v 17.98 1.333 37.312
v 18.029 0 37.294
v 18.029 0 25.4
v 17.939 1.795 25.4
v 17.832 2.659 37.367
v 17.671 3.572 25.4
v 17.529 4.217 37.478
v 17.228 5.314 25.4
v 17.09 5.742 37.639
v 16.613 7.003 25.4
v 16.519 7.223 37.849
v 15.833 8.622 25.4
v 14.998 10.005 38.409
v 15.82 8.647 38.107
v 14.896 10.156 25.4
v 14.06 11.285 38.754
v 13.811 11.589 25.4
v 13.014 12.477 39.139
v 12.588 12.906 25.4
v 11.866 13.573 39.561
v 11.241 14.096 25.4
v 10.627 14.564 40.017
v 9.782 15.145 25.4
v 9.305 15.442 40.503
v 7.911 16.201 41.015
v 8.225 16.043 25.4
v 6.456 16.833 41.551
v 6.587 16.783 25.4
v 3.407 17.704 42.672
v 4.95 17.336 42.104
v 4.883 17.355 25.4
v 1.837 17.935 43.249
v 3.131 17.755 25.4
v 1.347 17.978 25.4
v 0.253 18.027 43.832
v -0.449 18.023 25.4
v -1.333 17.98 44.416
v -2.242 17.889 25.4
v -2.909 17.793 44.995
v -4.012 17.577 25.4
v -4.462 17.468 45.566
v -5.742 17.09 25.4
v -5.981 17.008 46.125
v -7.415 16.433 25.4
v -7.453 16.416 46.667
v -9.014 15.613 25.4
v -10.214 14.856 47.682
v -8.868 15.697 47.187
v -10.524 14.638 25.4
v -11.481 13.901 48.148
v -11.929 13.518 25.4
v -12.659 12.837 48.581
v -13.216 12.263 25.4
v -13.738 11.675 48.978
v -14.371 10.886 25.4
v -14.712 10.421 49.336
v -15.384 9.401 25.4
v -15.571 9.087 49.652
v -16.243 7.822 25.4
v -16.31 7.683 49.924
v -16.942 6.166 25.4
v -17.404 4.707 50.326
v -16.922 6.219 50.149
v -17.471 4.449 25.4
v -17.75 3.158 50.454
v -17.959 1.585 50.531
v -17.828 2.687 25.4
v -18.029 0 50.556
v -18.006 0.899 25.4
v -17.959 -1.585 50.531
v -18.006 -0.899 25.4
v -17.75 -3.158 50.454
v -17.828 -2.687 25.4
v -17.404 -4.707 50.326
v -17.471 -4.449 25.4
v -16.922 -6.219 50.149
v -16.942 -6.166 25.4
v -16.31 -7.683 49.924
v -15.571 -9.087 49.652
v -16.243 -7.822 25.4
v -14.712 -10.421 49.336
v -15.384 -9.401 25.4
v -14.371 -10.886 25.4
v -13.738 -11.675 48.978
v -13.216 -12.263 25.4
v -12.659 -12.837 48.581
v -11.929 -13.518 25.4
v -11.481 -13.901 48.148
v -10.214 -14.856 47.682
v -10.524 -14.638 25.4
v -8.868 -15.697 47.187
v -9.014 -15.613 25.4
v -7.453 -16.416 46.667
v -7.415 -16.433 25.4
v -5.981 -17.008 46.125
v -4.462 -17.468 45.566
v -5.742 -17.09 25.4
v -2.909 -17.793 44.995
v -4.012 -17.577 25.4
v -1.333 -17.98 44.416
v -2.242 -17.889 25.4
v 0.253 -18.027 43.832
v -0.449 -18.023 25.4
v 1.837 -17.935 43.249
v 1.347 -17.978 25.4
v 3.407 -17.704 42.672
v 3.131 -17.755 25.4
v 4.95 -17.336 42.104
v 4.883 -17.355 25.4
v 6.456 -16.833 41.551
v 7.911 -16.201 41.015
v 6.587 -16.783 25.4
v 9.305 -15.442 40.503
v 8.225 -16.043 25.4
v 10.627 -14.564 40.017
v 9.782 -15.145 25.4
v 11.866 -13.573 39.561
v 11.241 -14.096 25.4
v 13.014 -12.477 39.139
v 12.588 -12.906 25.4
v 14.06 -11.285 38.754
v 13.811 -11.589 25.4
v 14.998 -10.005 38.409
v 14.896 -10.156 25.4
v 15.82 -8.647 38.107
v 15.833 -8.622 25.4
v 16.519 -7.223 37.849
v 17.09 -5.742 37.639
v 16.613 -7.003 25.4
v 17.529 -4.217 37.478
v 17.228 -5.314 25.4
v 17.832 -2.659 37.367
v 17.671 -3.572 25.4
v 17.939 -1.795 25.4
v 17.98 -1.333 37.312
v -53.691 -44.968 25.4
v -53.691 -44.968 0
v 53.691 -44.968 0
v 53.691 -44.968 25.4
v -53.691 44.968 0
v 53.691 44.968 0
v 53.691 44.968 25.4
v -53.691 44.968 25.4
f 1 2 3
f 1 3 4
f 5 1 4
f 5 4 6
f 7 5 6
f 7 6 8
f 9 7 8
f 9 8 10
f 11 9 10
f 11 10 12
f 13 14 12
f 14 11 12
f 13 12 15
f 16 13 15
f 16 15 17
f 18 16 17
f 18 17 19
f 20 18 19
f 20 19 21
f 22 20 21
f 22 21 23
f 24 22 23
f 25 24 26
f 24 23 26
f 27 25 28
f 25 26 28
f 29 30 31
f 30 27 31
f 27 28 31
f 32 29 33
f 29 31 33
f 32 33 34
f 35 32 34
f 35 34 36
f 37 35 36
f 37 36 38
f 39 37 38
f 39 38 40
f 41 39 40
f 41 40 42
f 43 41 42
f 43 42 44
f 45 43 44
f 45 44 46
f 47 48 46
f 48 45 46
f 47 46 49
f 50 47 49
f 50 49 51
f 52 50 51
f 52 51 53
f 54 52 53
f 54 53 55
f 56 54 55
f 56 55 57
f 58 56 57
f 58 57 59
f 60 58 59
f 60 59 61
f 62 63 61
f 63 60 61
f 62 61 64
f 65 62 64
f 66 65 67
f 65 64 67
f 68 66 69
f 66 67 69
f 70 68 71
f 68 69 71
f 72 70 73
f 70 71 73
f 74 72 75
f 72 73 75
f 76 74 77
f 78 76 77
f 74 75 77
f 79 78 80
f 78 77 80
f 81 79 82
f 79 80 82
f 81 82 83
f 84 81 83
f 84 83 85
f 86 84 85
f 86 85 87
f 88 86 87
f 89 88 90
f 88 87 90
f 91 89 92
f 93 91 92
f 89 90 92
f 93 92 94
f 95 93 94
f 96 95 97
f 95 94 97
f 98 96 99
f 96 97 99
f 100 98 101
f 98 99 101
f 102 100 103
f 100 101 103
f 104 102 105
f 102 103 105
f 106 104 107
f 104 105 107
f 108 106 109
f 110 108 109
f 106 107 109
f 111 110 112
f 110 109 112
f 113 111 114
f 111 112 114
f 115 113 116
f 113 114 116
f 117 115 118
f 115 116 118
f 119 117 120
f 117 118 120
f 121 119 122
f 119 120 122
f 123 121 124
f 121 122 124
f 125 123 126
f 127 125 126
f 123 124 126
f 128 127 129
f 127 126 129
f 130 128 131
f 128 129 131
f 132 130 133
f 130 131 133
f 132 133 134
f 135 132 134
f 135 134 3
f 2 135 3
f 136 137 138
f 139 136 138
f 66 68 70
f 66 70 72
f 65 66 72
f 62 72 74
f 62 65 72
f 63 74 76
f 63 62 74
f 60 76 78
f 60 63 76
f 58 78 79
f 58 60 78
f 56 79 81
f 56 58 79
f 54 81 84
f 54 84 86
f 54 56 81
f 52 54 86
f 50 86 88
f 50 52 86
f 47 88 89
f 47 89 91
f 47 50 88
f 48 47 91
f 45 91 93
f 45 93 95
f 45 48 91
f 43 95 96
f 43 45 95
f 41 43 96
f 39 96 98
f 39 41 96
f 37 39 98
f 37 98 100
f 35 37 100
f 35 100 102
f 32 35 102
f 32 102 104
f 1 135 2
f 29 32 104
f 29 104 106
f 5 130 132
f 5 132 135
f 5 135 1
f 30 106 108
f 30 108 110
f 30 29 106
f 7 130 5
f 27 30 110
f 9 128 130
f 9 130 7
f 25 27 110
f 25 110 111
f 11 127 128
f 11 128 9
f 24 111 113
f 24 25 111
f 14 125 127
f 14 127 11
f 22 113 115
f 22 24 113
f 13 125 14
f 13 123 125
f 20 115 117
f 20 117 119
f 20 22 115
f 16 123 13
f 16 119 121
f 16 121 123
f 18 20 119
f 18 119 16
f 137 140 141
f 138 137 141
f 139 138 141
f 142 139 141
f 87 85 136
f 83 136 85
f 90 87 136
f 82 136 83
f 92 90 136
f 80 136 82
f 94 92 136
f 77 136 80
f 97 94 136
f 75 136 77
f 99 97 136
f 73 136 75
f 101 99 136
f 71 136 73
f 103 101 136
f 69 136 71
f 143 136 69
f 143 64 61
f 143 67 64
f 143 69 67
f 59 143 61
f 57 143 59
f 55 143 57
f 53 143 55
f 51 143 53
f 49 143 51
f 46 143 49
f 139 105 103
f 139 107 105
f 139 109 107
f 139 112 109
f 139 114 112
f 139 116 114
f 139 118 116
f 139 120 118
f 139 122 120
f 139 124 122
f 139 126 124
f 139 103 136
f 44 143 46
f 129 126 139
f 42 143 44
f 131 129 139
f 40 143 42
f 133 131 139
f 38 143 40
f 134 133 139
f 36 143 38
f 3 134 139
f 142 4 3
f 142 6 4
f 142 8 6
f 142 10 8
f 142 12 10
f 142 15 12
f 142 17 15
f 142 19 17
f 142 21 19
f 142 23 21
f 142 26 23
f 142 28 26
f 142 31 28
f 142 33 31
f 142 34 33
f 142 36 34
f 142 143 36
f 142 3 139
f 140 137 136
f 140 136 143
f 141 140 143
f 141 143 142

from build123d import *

# Parameters (mm, degrees)
F0_W          = 107.3818355799
F0_H          = 89.936055243
F1_DEPTH      = 25.4
F2_R          = 18.0288778137
F3_DEPTH      = 25.4
F5_DEPTH      = 44.9690276215
F5_DEPTH_BACK = 25.4


with BuildPart() as f1:
    # F0 (on Top) → F1 (new body)
    with BuildSketch(Plane.XY):
        Rectangle(F0_W, F0_H)
    extrude(amount=F1_DEPTH)

    # F2 (on face) → F3 (join)
    with BuildSketch(Plane.XY.offset(25.4)):
        Circle(F2_R)
    extrude(amount=F3_DEPTH)

    # F4 (on Front) → F5 (cut, two sides)
    with BuildSketch(Plane.XZ) as f5_sk:
        Polygon((18.27981323, 50.8), (-18.6916068196, 50.8), (18.27981323, 37.2017361224), align=None)
    extrude(amount=-F5_DEPTH, mode=Mode.SUBTRACT)
    extrude(f5_sk.sketch, amount=F5_DEPTH_BACK, mode=Mode.SUBTRACT)


solid = f1.part
